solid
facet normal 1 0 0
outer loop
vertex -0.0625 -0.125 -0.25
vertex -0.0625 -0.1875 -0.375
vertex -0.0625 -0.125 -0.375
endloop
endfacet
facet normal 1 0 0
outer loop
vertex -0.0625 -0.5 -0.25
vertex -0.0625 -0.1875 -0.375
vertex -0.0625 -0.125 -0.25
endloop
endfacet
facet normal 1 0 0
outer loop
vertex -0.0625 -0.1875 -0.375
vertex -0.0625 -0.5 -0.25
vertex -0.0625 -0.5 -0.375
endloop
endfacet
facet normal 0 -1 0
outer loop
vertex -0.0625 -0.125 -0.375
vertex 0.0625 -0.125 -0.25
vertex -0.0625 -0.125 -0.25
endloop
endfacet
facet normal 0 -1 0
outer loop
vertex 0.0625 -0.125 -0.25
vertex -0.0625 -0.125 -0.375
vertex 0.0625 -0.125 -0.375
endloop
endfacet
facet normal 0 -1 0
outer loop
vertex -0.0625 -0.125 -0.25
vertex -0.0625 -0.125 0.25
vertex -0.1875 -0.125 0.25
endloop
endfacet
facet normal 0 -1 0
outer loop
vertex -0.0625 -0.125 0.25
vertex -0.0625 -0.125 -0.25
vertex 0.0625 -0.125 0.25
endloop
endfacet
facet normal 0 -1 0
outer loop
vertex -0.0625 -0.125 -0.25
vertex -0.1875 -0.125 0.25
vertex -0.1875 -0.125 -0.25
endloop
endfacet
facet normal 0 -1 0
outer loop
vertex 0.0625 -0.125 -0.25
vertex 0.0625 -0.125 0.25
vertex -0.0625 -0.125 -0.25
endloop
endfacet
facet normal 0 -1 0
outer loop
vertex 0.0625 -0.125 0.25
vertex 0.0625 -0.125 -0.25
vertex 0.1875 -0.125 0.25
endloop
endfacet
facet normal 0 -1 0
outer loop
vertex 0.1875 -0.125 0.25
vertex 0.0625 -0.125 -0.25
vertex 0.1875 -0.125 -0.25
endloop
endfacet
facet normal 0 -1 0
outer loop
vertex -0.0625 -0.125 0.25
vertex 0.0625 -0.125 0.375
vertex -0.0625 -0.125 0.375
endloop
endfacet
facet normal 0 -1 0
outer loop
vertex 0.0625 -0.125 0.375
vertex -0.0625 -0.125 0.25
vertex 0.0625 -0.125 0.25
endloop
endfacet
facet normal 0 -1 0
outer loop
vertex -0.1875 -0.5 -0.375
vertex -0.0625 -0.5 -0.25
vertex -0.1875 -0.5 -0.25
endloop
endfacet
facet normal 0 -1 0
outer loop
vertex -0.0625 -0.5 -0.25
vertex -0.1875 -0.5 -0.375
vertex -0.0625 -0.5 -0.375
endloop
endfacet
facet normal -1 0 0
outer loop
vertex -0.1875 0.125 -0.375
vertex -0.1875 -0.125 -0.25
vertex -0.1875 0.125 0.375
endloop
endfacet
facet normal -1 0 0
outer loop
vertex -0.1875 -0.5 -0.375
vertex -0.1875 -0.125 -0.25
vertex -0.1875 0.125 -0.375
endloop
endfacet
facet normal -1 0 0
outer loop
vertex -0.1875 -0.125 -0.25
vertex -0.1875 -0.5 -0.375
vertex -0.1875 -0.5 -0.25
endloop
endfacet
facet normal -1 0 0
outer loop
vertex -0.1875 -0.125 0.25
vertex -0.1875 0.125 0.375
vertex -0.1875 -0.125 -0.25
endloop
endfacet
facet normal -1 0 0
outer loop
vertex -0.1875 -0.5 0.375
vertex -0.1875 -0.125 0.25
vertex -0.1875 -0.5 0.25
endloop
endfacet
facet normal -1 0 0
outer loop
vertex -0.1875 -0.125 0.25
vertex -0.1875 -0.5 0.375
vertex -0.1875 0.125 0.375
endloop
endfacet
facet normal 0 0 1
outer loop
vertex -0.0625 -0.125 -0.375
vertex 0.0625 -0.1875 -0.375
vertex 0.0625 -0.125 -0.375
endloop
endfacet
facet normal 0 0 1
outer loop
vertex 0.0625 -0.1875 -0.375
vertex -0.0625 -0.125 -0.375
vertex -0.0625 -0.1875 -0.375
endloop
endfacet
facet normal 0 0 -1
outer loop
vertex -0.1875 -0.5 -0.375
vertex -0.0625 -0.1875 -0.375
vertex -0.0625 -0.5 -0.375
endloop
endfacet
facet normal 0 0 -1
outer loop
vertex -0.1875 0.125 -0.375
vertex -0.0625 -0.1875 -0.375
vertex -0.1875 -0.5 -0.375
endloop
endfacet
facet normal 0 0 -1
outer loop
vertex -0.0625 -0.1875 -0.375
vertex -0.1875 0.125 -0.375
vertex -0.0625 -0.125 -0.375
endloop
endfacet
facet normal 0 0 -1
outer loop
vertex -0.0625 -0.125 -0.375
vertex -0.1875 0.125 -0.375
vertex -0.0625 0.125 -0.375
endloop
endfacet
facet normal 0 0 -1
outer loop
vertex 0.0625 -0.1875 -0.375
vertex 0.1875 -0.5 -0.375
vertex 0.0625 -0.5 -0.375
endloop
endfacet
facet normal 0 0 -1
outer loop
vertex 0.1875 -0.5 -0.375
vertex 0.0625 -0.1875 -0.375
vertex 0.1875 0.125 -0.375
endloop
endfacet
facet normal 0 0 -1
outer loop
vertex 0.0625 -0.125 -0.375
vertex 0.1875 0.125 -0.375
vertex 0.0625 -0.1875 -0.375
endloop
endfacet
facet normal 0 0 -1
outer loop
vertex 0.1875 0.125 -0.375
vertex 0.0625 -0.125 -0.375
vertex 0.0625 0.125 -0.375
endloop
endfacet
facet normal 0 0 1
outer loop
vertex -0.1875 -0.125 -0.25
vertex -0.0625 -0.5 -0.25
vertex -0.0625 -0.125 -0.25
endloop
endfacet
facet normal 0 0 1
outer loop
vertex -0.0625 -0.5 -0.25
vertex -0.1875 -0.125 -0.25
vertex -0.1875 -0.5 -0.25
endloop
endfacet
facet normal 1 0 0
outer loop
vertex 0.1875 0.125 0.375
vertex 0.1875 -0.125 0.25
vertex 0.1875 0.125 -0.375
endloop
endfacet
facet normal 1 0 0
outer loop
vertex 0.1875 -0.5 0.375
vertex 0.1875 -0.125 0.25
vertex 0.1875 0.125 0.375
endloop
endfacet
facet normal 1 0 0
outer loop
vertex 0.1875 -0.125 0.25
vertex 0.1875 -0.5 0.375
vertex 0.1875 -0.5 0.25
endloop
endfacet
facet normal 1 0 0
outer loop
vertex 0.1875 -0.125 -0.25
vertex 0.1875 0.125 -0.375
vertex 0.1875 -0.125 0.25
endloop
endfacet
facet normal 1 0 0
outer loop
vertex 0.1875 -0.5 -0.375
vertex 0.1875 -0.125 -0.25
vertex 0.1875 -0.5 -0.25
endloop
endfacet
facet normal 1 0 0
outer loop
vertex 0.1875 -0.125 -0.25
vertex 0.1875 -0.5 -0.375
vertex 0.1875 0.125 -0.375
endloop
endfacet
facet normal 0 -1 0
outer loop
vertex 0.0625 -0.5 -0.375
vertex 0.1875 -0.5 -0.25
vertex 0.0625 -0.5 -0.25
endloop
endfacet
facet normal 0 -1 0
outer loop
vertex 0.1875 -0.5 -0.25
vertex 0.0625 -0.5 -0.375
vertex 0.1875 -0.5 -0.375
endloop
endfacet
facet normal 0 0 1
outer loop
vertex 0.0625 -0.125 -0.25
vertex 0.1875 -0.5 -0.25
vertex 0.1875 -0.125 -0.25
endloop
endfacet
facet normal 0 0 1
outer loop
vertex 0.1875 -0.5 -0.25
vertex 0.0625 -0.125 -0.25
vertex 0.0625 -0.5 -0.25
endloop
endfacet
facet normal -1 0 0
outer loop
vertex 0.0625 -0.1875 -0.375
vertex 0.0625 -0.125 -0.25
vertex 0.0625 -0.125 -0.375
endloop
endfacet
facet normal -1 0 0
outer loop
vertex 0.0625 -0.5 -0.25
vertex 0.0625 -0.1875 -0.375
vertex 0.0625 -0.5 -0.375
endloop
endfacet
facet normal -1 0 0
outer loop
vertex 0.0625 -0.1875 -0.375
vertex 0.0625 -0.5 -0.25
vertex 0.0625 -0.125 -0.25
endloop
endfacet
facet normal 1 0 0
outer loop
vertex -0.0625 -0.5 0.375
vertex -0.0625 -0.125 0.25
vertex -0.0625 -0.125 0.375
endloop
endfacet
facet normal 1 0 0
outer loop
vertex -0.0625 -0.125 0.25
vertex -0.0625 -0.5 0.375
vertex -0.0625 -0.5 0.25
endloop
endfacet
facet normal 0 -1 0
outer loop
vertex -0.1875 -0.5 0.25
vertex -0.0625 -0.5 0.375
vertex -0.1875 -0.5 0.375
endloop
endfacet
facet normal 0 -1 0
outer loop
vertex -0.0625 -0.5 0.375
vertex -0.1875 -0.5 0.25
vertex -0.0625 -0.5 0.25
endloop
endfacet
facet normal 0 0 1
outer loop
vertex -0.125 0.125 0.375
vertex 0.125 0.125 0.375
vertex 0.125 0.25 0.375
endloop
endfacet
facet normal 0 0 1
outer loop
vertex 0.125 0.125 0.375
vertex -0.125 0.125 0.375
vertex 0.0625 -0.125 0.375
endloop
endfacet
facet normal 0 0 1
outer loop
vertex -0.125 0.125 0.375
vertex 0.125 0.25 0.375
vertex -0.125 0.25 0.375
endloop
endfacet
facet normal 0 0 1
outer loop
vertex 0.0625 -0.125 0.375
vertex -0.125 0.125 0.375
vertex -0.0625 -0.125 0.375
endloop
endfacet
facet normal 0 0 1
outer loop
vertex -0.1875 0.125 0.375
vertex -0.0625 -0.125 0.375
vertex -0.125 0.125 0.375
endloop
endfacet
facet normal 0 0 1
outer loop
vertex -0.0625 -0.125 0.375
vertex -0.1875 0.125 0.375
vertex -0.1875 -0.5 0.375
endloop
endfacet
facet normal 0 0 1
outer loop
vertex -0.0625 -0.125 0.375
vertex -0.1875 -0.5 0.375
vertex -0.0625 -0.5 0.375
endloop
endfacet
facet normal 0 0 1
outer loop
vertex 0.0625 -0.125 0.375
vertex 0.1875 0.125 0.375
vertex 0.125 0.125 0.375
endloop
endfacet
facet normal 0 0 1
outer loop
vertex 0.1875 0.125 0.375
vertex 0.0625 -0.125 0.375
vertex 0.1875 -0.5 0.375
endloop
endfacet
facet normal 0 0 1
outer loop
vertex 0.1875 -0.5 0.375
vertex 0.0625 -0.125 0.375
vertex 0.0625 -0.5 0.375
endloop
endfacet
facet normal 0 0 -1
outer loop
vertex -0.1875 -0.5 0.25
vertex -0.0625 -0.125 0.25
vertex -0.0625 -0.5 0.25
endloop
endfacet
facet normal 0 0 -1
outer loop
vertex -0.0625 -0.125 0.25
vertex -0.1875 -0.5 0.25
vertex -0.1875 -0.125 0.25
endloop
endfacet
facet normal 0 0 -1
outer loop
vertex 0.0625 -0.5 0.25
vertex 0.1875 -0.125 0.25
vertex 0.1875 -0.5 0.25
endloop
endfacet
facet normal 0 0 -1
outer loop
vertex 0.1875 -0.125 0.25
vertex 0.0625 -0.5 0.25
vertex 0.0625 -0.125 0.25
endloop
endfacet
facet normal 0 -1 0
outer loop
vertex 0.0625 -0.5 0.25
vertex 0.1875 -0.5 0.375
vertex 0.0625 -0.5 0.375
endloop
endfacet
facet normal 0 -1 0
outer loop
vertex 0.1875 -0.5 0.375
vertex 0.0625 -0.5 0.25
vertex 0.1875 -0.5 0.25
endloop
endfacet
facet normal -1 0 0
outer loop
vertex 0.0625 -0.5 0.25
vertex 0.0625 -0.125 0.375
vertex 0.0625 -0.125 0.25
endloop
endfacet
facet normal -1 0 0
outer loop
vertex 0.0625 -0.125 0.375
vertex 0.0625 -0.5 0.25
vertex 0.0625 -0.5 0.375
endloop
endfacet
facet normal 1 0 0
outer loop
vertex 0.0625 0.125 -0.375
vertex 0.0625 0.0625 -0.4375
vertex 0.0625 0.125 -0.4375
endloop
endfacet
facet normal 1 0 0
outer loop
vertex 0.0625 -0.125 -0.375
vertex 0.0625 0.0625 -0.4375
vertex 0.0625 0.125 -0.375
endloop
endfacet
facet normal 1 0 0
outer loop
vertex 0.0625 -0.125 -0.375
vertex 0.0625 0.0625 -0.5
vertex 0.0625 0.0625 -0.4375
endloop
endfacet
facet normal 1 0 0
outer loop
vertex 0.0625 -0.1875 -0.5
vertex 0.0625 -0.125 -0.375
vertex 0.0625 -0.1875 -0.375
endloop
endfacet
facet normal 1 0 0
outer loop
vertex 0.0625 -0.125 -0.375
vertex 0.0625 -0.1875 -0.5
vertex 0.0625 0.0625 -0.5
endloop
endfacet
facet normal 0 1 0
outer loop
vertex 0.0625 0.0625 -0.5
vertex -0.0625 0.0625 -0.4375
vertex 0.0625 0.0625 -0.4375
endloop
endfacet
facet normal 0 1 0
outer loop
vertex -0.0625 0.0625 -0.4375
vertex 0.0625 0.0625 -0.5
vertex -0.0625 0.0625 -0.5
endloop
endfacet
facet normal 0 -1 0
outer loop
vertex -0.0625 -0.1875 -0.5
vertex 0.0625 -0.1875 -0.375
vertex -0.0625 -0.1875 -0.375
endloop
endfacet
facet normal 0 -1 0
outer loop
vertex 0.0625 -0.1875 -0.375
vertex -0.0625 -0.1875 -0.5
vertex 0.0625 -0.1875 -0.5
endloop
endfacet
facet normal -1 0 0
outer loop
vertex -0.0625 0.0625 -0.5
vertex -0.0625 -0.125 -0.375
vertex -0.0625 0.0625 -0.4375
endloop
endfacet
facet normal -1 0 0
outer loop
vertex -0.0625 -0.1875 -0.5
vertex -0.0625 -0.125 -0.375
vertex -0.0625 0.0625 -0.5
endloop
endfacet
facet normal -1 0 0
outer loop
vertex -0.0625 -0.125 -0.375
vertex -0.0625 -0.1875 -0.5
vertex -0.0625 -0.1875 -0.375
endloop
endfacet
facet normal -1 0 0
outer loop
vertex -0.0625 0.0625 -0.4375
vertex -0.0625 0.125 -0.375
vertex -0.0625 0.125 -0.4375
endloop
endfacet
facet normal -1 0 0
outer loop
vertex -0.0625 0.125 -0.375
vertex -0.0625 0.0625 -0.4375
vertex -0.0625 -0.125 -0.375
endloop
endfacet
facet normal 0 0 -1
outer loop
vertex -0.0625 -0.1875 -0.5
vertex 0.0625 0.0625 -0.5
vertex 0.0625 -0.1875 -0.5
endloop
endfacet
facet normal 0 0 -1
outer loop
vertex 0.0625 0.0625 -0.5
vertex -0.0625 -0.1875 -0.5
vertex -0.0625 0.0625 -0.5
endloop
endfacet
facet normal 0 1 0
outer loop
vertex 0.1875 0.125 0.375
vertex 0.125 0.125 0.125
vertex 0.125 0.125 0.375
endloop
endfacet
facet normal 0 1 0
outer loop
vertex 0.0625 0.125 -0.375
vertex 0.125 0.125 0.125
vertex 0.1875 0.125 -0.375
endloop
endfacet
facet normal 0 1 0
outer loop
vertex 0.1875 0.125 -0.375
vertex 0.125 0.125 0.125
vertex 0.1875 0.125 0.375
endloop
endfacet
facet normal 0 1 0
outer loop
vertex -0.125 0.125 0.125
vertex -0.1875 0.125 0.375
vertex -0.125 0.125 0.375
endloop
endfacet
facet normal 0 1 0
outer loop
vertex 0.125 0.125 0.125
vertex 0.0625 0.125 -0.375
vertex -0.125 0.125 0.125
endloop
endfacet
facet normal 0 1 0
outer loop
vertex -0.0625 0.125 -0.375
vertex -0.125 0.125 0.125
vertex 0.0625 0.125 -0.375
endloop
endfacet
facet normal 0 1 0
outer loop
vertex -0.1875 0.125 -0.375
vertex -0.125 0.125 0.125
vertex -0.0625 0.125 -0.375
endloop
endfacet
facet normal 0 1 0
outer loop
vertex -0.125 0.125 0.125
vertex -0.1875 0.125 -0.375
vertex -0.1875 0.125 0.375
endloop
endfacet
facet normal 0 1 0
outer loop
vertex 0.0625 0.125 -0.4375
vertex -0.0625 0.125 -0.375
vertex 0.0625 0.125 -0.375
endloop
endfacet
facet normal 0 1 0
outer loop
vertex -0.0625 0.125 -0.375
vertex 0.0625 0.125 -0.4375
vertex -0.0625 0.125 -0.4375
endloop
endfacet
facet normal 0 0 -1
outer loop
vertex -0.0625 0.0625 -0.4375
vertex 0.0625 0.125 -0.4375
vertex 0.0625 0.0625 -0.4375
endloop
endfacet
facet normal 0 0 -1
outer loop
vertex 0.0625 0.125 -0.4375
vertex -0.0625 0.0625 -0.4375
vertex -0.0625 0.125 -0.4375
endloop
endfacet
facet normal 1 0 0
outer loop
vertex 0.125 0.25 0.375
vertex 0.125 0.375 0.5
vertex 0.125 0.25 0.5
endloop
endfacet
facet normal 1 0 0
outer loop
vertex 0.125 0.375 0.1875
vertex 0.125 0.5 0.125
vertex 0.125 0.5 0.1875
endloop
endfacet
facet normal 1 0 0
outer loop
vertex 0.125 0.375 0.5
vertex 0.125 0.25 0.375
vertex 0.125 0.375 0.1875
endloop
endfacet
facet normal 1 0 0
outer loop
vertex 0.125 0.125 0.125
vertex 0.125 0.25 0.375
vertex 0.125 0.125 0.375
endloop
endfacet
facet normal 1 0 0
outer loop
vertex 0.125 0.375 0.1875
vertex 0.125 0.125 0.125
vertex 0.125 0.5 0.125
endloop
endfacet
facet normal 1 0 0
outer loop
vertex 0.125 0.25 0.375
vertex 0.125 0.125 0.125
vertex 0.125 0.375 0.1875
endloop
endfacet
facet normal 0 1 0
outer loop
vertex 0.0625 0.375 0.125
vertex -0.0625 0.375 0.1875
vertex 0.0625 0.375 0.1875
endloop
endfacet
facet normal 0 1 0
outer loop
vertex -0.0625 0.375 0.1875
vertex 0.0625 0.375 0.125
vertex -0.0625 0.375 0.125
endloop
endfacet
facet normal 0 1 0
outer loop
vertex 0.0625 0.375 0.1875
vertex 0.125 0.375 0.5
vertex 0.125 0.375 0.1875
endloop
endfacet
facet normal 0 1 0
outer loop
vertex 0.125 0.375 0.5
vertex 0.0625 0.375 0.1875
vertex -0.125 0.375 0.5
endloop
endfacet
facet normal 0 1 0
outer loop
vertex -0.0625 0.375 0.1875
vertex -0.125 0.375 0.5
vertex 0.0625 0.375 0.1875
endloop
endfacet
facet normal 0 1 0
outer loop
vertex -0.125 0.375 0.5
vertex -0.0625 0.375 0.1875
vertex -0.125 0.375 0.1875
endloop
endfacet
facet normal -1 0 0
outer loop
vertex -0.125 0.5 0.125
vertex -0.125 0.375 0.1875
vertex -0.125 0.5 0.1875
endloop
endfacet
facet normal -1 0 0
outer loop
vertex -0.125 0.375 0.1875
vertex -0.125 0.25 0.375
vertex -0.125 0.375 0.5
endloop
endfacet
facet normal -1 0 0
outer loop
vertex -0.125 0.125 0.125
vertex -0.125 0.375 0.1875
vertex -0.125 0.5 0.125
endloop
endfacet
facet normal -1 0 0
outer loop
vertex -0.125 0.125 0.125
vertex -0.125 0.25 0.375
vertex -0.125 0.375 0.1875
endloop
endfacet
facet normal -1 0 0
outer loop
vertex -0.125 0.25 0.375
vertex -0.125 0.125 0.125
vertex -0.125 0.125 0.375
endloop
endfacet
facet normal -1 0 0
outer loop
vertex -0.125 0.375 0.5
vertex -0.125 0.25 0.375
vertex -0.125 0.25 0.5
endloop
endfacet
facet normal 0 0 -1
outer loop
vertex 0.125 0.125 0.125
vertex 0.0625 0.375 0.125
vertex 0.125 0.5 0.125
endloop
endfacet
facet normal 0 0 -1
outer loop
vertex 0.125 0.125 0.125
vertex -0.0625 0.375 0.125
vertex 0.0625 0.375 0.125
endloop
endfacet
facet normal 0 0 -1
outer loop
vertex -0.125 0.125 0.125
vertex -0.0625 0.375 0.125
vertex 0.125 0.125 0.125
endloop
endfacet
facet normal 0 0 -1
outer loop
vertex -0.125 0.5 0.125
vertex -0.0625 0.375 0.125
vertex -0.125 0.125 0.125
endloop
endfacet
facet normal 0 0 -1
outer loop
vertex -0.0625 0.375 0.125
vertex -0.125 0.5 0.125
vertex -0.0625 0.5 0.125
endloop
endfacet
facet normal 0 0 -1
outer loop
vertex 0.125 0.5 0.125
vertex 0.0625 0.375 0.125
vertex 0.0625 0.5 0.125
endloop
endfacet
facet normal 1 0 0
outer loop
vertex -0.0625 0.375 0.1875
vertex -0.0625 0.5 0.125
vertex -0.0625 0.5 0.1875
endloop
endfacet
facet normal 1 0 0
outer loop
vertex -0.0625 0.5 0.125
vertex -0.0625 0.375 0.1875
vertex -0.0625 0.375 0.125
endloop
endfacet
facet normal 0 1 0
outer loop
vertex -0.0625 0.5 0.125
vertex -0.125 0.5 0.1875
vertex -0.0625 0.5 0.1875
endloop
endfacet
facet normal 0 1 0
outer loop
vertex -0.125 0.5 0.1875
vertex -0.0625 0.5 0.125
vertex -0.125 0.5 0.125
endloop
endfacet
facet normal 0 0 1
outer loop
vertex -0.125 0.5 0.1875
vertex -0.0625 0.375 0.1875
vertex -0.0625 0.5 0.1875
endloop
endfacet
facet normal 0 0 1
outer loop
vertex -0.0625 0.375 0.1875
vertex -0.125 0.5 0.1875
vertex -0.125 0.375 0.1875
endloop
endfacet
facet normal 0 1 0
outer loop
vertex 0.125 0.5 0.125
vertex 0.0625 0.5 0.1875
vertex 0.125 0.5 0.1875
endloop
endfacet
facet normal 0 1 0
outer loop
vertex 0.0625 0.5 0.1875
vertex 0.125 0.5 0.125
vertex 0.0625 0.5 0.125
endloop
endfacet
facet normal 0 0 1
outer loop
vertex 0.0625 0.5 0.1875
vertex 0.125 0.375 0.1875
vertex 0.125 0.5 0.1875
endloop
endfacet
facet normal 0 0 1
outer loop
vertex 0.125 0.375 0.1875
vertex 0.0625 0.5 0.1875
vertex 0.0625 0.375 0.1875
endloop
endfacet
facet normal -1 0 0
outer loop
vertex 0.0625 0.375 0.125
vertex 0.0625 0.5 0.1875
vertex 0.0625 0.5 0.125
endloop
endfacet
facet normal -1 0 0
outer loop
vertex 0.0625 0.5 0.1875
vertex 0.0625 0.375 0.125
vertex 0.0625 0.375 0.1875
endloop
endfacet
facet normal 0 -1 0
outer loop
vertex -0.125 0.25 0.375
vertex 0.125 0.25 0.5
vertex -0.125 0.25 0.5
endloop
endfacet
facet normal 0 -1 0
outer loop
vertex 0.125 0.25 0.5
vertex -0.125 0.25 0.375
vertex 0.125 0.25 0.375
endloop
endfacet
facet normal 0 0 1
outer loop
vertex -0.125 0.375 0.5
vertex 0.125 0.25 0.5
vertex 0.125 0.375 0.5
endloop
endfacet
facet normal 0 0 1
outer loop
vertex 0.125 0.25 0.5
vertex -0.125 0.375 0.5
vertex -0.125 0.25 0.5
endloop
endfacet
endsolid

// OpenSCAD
module leg() {
    translate([-3/16, 4/16, -8/16])
        cube([2/16, 2/16, 6/16]);
}

module two_legs() {
    leg();
    mirror([1, 0, 0])
        leg();
}

module ear() {
    translate([-2/16, -3/16, 6/16])
        cube([1/16, 1/16, 2/16]);
}

rotate(-90, [1, 0, 0]) {
    two_legs();
    mirror([0, 1, 0])
        two_legs();
    translate([-1/16, 6/16, -3/16])
        cube([2/16, 2/16, 4/16]);
    translate([-1/16, 6/16, 1/16])
        cube([2/16, 1/16, 1/16]);
    translate([-3/16, -6/16, -2/16])
        cube([6/16, 12/16, 4/16]);
    translate([-2/16, -6/16, 2/16])
        cube([4/16, 4/16, 4/16]);
    ear();
    mirror([1, 0, 0])
        ear();
    translate([-2/16, -8/16, 4/16])
        cube([4/16, 2/16, 2/16]);
}
